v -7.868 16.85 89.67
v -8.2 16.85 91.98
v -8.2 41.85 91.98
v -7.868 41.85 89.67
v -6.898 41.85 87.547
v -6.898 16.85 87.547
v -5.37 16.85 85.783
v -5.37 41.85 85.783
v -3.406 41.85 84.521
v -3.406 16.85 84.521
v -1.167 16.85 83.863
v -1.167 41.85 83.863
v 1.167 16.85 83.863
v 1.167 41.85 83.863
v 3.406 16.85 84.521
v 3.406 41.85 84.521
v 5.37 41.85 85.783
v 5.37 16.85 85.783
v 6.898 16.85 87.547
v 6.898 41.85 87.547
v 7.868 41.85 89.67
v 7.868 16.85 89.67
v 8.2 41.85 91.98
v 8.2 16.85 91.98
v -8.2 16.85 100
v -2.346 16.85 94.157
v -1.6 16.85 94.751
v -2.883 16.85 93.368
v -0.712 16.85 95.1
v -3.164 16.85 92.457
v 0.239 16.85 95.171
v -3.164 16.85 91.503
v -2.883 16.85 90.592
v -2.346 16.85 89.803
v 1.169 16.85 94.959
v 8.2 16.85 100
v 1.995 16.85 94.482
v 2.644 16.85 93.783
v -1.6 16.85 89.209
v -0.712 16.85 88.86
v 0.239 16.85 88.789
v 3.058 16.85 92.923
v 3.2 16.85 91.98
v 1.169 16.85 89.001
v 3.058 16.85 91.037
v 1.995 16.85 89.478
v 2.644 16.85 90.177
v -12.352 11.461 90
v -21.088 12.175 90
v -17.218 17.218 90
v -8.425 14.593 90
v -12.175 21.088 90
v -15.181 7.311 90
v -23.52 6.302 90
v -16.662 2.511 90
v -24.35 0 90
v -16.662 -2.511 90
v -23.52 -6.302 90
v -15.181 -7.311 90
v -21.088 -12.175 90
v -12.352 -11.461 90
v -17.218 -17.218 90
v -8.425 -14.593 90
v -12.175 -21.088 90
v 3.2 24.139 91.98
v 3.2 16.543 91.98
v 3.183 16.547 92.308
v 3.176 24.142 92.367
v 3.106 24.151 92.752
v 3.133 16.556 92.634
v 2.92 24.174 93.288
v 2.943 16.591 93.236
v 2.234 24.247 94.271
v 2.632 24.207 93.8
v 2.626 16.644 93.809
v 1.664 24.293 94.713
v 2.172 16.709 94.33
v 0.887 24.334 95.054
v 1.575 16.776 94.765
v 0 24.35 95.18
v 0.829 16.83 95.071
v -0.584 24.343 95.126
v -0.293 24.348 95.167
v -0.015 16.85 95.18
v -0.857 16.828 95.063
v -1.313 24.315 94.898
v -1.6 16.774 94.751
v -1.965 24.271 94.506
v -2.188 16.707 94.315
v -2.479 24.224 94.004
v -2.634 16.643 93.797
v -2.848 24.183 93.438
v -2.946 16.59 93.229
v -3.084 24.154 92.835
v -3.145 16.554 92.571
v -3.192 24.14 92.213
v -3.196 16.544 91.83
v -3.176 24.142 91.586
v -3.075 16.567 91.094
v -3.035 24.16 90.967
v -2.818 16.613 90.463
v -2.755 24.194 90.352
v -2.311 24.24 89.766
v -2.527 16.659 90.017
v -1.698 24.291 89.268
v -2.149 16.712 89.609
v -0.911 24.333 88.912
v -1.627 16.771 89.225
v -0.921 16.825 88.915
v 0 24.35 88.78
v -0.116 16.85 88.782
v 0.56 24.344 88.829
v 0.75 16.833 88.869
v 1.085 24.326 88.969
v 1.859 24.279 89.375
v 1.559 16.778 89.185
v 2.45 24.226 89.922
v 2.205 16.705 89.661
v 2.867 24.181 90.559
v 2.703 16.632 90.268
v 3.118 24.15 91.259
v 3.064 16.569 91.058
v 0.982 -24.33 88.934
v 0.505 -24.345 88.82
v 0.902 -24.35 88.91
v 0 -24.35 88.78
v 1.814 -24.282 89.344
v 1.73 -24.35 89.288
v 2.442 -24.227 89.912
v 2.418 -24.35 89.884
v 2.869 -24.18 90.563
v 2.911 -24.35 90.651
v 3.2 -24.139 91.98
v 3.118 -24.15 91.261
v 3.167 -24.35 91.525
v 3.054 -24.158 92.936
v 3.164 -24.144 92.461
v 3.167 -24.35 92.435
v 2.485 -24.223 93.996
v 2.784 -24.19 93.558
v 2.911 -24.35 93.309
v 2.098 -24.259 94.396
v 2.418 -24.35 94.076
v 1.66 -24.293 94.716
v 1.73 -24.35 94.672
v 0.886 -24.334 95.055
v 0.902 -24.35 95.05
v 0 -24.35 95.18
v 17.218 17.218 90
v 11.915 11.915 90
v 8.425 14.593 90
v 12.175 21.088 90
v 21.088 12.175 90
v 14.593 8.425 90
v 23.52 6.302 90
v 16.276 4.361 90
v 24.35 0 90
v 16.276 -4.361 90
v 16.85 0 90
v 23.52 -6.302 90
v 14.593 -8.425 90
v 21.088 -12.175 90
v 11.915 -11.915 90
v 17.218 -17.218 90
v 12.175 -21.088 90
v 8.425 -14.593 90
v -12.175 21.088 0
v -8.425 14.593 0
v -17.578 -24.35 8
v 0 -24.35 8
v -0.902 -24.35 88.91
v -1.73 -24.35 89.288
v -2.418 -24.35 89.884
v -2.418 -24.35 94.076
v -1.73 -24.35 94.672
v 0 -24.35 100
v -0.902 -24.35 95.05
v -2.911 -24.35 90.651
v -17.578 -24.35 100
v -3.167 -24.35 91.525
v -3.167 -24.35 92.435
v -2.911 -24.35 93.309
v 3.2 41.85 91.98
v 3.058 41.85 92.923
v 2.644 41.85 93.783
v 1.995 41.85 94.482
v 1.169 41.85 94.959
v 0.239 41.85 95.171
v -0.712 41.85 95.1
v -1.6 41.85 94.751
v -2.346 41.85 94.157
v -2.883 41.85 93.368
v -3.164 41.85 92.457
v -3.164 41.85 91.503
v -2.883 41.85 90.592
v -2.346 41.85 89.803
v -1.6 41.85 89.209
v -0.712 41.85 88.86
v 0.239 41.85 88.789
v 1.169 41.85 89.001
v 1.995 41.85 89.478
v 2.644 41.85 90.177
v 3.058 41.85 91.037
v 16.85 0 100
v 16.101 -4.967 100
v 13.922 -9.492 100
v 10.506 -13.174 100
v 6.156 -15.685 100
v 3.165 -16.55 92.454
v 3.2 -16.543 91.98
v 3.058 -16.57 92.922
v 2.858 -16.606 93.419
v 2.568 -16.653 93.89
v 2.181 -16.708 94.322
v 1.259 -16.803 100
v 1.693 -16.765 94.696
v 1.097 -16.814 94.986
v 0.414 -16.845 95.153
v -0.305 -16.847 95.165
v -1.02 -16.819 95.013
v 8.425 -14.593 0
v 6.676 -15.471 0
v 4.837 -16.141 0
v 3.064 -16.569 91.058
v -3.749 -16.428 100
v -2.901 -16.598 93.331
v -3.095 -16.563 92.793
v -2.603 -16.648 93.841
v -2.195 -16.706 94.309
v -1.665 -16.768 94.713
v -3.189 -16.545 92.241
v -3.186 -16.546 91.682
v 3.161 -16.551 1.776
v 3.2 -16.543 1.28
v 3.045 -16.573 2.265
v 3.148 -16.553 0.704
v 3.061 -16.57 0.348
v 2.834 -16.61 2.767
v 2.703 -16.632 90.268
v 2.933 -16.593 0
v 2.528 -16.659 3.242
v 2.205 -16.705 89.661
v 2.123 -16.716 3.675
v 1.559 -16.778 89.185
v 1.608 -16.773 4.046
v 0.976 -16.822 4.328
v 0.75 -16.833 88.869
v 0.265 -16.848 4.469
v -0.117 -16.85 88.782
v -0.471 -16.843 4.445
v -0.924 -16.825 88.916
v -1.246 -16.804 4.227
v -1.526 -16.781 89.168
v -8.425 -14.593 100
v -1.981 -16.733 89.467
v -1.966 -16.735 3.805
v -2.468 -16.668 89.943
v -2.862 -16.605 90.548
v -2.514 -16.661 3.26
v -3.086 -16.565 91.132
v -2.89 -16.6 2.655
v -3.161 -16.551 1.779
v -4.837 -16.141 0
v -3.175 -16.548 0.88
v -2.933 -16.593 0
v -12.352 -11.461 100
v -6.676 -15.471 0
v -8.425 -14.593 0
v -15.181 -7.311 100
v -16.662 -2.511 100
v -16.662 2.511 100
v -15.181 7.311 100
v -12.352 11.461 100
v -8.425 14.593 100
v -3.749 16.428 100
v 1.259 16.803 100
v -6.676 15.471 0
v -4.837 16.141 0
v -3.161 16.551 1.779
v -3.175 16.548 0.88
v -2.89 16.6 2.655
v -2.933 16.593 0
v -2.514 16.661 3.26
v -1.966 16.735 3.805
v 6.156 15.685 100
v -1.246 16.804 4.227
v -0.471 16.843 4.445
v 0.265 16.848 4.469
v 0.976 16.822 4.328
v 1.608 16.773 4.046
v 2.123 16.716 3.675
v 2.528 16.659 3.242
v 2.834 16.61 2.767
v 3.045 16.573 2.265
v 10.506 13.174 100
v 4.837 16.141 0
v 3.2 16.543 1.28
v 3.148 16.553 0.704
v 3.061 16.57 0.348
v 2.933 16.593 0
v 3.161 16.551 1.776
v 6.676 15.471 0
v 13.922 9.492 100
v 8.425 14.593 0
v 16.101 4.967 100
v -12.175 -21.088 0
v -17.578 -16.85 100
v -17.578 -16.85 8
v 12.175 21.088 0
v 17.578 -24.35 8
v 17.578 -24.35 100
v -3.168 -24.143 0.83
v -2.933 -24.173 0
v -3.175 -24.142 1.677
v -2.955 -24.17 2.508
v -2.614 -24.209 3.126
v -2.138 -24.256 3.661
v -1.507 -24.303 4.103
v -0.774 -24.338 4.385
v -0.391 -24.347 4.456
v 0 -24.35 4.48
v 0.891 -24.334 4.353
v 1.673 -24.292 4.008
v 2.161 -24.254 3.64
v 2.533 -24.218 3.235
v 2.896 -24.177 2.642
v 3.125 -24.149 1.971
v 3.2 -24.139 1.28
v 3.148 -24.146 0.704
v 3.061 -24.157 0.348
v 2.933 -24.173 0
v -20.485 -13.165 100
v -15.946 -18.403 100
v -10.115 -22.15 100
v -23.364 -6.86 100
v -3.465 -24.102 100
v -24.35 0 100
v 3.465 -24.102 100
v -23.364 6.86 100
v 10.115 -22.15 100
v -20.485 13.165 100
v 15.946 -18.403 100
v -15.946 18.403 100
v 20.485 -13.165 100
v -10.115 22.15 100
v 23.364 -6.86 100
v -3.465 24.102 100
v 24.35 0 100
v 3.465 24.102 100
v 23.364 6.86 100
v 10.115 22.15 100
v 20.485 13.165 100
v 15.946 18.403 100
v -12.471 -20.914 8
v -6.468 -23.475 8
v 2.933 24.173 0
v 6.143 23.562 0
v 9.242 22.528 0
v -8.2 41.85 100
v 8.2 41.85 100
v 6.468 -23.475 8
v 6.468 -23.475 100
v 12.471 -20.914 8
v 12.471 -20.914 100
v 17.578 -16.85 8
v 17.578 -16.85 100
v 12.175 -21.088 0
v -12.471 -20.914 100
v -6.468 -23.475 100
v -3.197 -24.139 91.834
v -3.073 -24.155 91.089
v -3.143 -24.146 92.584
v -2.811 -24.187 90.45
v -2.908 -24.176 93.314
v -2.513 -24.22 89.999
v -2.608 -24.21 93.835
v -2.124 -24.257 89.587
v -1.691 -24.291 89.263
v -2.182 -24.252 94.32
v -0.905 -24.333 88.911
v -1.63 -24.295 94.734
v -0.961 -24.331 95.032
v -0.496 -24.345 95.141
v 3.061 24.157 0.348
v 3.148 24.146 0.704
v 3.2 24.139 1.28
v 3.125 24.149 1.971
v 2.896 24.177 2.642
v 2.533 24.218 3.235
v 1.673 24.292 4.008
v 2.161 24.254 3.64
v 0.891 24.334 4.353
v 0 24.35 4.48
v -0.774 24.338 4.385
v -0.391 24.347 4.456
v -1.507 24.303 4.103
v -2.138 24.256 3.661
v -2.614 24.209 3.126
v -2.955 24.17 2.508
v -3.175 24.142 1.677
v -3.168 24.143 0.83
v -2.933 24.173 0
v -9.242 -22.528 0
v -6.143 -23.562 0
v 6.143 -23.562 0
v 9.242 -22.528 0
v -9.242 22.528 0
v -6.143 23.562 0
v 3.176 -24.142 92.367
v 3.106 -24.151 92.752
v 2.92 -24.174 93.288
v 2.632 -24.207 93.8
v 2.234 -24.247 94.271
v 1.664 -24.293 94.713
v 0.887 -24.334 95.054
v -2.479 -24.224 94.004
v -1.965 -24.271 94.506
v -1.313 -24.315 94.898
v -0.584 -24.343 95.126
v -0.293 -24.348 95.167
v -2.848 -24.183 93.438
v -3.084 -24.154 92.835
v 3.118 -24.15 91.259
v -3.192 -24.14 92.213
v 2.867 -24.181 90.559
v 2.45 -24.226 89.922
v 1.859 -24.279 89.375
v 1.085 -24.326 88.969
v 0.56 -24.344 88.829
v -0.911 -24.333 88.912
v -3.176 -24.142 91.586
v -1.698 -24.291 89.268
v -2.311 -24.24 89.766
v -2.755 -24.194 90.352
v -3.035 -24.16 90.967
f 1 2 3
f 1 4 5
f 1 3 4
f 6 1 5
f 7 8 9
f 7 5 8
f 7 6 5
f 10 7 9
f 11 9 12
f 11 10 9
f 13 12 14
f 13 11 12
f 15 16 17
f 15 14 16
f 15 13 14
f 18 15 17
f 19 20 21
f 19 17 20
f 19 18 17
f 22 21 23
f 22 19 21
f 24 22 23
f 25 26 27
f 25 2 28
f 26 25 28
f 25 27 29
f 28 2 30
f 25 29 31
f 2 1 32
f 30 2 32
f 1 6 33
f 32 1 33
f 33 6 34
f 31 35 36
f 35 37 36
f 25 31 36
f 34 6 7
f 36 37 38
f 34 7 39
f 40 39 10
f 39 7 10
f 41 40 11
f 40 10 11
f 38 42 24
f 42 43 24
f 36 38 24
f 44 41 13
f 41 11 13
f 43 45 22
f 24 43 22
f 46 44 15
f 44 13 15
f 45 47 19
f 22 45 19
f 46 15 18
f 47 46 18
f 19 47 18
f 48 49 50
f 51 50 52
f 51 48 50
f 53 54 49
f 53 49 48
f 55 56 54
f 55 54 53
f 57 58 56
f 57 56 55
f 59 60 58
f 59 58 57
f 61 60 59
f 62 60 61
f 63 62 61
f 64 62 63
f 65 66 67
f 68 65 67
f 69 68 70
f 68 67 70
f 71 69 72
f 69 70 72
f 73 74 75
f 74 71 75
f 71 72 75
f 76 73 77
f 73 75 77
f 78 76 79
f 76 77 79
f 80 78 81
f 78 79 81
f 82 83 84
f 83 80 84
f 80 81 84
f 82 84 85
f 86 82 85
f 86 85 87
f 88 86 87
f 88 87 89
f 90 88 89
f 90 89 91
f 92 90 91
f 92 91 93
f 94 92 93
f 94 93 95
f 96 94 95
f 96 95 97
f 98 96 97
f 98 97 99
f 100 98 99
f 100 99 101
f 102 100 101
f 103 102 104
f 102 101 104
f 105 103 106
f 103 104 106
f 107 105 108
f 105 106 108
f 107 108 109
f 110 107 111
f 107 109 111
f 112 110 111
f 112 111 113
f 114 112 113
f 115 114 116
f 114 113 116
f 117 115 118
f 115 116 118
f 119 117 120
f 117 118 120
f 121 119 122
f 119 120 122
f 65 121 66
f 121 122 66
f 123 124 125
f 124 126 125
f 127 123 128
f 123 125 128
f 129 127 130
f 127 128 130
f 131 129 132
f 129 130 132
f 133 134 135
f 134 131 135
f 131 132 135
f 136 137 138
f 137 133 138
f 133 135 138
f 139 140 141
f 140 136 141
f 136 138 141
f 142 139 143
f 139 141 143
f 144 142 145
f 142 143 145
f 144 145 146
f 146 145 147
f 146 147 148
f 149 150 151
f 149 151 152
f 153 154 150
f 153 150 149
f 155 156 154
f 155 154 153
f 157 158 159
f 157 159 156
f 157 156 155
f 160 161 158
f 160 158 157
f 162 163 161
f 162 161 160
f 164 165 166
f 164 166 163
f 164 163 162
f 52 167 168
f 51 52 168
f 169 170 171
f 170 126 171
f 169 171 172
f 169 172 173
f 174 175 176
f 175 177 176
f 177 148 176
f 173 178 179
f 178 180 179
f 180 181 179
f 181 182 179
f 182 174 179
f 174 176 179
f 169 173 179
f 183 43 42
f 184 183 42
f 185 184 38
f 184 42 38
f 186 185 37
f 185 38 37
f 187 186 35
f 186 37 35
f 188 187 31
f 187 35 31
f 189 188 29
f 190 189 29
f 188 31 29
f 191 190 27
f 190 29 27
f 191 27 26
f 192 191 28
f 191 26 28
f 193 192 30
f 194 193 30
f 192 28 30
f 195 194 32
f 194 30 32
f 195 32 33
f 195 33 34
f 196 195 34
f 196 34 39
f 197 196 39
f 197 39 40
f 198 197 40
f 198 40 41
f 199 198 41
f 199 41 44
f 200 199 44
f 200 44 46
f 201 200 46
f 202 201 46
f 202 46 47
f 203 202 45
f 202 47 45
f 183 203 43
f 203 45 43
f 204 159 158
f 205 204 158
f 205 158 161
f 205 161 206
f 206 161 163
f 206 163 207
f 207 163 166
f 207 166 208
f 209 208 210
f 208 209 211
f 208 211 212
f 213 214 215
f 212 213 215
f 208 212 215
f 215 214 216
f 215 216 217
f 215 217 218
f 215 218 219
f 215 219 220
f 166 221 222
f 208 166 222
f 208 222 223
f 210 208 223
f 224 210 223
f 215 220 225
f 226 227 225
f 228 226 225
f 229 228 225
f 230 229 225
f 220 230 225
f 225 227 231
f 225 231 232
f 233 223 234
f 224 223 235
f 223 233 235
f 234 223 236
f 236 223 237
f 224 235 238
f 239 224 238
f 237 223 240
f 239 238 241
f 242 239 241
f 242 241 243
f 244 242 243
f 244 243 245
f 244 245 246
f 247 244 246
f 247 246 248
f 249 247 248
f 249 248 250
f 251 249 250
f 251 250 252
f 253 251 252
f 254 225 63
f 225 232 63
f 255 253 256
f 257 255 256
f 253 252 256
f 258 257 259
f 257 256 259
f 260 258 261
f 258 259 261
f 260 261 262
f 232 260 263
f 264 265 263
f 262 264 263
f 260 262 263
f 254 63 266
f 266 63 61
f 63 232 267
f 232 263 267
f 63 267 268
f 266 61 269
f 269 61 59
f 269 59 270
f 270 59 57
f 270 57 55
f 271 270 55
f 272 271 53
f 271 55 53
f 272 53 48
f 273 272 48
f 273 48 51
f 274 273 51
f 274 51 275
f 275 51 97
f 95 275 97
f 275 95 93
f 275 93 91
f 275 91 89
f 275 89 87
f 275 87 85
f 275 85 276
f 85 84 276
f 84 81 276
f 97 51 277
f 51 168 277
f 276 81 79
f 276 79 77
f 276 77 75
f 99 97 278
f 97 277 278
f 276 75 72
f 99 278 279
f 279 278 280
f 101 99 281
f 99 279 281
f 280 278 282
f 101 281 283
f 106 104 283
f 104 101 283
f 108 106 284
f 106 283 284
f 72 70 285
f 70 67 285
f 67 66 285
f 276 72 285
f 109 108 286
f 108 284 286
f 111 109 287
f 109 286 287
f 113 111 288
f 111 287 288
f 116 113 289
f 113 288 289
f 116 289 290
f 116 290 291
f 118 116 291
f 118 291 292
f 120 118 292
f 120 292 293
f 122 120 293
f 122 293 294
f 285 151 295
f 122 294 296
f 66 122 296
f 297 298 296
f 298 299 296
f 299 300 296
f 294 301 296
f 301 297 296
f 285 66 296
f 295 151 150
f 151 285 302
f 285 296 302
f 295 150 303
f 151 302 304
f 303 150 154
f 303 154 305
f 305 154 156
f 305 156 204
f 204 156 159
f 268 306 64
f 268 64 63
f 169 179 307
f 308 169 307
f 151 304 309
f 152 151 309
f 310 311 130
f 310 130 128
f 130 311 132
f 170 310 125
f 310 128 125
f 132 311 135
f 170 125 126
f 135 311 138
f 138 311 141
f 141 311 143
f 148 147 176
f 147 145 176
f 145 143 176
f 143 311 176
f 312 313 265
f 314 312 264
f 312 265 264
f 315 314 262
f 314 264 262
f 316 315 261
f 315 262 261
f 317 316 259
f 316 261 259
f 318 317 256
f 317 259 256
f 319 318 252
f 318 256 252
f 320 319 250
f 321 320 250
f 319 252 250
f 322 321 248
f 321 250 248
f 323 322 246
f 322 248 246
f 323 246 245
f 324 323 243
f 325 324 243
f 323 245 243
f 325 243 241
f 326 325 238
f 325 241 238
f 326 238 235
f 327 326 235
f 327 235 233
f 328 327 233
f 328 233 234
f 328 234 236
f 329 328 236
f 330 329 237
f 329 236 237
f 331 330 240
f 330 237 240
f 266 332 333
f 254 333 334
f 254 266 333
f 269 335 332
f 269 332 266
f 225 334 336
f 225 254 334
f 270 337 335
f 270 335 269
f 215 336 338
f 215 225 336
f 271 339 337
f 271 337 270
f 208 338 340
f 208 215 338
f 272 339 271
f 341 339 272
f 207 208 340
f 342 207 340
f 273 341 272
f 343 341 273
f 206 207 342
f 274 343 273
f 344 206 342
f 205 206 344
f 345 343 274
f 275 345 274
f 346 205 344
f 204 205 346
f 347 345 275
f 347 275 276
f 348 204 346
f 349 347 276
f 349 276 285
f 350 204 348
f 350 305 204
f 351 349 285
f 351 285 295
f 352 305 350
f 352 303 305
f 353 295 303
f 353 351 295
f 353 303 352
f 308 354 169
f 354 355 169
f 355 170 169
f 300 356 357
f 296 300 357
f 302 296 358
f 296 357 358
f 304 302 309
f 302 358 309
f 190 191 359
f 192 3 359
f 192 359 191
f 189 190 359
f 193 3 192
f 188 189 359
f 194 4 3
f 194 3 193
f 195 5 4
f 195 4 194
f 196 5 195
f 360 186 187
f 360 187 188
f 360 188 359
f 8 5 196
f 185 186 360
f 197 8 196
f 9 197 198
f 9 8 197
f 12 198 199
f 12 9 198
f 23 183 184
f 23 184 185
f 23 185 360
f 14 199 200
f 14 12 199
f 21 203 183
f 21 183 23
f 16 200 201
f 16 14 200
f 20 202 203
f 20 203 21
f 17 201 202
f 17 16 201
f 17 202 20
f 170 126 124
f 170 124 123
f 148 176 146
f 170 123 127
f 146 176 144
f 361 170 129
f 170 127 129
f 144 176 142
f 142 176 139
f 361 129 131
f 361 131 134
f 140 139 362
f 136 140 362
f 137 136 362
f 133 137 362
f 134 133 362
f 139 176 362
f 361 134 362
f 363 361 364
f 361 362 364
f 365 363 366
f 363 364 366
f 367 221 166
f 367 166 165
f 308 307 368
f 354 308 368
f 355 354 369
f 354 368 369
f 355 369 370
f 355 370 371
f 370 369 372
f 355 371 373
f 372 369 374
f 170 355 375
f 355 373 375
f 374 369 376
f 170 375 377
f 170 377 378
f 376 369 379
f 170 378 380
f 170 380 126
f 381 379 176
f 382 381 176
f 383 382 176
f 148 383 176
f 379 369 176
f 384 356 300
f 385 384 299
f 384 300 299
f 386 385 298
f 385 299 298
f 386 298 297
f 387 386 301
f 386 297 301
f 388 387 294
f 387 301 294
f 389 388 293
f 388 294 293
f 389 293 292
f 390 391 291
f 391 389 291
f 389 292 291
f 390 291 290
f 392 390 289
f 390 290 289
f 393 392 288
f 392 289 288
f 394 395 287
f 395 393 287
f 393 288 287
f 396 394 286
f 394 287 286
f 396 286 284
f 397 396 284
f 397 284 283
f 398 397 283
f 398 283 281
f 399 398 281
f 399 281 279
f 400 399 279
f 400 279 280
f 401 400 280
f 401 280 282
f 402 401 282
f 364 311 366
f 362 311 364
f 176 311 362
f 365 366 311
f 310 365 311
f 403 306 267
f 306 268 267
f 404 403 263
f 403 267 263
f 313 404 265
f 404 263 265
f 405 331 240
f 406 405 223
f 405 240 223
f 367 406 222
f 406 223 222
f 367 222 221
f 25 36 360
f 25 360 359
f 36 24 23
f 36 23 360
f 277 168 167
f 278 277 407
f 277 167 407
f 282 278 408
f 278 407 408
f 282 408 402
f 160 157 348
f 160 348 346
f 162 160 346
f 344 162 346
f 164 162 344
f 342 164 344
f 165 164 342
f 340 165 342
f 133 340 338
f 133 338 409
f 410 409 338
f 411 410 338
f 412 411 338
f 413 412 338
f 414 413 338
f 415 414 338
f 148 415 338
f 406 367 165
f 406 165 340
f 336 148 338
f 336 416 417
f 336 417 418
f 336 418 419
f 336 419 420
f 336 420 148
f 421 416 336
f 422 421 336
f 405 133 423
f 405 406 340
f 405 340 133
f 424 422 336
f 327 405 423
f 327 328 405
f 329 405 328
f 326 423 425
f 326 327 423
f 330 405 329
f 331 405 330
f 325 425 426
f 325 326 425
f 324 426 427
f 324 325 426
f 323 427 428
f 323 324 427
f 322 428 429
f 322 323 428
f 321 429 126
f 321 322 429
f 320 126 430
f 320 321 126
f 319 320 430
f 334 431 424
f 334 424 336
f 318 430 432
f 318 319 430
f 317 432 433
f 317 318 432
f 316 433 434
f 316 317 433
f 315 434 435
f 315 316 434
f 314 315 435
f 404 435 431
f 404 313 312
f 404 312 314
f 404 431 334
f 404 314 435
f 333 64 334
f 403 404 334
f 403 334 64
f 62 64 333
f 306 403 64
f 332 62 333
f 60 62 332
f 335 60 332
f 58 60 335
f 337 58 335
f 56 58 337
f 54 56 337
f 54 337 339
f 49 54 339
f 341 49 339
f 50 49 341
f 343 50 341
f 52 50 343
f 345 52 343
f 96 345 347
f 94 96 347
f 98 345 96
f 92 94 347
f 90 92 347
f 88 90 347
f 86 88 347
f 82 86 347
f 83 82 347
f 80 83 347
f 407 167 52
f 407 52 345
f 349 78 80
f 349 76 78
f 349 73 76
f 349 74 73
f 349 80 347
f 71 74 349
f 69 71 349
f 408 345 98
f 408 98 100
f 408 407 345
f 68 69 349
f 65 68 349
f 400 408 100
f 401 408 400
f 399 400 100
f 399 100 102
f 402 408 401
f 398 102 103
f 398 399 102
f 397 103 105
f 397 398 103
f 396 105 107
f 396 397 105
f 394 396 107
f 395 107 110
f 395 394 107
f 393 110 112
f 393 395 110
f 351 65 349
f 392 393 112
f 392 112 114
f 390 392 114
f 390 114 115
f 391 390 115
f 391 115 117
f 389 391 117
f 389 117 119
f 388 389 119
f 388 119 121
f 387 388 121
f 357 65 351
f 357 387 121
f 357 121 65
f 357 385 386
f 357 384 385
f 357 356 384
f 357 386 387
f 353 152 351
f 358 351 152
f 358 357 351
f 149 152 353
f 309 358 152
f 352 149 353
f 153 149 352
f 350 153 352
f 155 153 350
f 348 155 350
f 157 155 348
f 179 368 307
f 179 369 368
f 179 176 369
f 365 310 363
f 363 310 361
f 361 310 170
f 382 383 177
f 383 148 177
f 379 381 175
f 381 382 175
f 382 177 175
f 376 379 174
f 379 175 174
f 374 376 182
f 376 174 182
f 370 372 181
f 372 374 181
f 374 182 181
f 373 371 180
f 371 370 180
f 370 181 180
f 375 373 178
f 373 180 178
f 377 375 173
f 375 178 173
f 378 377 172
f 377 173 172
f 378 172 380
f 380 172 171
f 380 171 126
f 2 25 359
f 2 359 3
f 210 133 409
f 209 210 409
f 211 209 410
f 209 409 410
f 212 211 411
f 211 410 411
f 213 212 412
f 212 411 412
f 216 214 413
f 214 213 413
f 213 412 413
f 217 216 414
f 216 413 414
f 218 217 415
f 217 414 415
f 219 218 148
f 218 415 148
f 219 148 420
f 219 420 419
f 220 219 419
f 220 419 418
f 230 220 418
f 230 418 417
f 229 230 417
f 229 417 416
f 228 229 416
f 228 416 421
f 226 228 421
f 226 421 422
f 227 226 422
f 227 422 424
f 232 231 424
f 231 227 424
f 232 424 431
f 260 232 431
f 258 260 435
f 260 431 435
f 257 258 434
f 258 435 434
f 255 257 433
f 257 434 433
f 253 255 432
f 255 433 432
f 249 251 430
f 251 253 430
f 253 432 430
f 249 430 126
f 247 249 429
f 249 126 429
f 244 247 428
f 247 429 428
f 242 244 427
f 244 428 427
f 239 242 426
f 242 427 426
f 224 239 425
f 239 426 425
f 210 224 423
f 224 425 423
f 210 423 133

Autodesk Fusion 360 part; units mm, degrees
sketch "Main Body" plane through (0, 0, 0) normal (0, 0, 1) x (1, 0, 0)
  circle A0 centre (0, 0) radius 16.85
  circle A1 centre (0, 0) radius 24.35
  dimension "d1" = 33.7
  dimension "d2" = 48.7
extrude "Extrude1" add sketch "Main Body" along normal blind 100 makes body 1
sketch "Cut Guide" plane through (0, 0, 0) normal (0, 1, 0) x (1, 0, 0)
  circle A0 centre (0, -1.28) radius 3.2
  circle A1 centre (0, -91.98) radius 3.2
  circle A2 centre (0, -91.98) radius 8.2
  line L0 (-8.2, -91.98) -> (8.2, -91.98)
  line L1 (8.2, -91.98) -> (8.2, -100)
  line L2 (8.2, -100) -> (-8.2, -100)
  line L3 (-8.2, -100) -> (-8.2, -91.98)
  point P0 (0, -41.6319)
  dimension "d5" = 6.4
  dimension "d6" = 1.28
  dimension "d11" = 6.4
  dimension "d12" = 90.7
  dimension "d13" = 16.4
  dimension "d33" = 8.02
extrude "Extrude2" cut sketch "Cut Guide" along normal blind 24.35 and the other way blind 24.35 contours A0 bodies 1
extrude "Extrude3" add sketch "Cut Guide" along normal blind 25 from surface at 16.85 separate body contours A1 A2 L0 L2 | A1 A2 L0 | A2 L1 L2 | A2 L2 L3 makes body 2
sketch "Side Removal" plane through (0, 0, 0) normal (0, 0, -1) x (1, 0, 0)
  line L0 (-2.9328, 16.5928) -> (-2.9328, 24.1727)
  arc A0 (-2.9328, 24.1727) -> (-2.9328, -24.1727) centre (0, 0) ccw
  line L1 (-2.9328, -24.1727) -> (-2.9328, -16.5928)
  arc A1 (-2.9328, 16.5928) -> (-2.9328, -16.5928) centre (0, 0) ccw
  line L2 (-12.175, -21.0877) -> (12.175, 21.0877)
  arc A2 (2.9328, -24.1727) -> (2.9328, 24.1727) centre (0, 0) ccw
  line L3 (-12.175, 21.0877) -> (12.175, -21.0877)
  dimension "d19" = 120
extrude "Extrude4" cut sketch "Side Removal" against normal blind 90 contours L2 A2 L3 | A1 L2 L3 | A0 A1 L2 L3 bodies 1
sketch "Flat Bottom" plane through (0, 0, 100) normal (0, 0, 1) x (-1, 0, 0)
  circle A0 centre (0, 0) radius 16.85
  circle A1 centre (0, 0) radius 24.35
  line L0 (17.5784, 16.85) -> (-17.5784, 16.85)
  line L1 (-17.5784, 16.85) -> (-17.5784, 24.35)
  line L2 (-17.5784, 24.35) -> (17.5784, 24.35)
  line L3 (17.5784, 24.35) -> (17.5784, 16.85)
extrude "Extrude6" add sketch "Flat Bottom" against normal blind 92 separate body contours A1 L2 L3 | A1 L1 L2 makes body 3 at (-13.3955, -20.3343, 38.6667)
extrude "Extrude7" cut sketch "Cut Guide" along normal blind 24.35 and the other way blind 24.35 contours A1 L0 | A1 L0 bodies 1 3
equation "d2 = d1 + 15 mm"
equation "d3 = 100 mm"
equation "d6 = d5 / 5"
equation "d7 = d2 / 2"
equation "d9 = d2 / 2"
equation "d13 = d11 + 10 mm"
equation "d16 = ( d1 ) / 2"
equation "d21 = -( d3 - 10 mm )"
equation "d27 = -d3 + 8 mm"
equation "d29 = d2 / 2"
equation "d31 = d2 / 2"
equation "d33 = d3 - d12 - d6"
